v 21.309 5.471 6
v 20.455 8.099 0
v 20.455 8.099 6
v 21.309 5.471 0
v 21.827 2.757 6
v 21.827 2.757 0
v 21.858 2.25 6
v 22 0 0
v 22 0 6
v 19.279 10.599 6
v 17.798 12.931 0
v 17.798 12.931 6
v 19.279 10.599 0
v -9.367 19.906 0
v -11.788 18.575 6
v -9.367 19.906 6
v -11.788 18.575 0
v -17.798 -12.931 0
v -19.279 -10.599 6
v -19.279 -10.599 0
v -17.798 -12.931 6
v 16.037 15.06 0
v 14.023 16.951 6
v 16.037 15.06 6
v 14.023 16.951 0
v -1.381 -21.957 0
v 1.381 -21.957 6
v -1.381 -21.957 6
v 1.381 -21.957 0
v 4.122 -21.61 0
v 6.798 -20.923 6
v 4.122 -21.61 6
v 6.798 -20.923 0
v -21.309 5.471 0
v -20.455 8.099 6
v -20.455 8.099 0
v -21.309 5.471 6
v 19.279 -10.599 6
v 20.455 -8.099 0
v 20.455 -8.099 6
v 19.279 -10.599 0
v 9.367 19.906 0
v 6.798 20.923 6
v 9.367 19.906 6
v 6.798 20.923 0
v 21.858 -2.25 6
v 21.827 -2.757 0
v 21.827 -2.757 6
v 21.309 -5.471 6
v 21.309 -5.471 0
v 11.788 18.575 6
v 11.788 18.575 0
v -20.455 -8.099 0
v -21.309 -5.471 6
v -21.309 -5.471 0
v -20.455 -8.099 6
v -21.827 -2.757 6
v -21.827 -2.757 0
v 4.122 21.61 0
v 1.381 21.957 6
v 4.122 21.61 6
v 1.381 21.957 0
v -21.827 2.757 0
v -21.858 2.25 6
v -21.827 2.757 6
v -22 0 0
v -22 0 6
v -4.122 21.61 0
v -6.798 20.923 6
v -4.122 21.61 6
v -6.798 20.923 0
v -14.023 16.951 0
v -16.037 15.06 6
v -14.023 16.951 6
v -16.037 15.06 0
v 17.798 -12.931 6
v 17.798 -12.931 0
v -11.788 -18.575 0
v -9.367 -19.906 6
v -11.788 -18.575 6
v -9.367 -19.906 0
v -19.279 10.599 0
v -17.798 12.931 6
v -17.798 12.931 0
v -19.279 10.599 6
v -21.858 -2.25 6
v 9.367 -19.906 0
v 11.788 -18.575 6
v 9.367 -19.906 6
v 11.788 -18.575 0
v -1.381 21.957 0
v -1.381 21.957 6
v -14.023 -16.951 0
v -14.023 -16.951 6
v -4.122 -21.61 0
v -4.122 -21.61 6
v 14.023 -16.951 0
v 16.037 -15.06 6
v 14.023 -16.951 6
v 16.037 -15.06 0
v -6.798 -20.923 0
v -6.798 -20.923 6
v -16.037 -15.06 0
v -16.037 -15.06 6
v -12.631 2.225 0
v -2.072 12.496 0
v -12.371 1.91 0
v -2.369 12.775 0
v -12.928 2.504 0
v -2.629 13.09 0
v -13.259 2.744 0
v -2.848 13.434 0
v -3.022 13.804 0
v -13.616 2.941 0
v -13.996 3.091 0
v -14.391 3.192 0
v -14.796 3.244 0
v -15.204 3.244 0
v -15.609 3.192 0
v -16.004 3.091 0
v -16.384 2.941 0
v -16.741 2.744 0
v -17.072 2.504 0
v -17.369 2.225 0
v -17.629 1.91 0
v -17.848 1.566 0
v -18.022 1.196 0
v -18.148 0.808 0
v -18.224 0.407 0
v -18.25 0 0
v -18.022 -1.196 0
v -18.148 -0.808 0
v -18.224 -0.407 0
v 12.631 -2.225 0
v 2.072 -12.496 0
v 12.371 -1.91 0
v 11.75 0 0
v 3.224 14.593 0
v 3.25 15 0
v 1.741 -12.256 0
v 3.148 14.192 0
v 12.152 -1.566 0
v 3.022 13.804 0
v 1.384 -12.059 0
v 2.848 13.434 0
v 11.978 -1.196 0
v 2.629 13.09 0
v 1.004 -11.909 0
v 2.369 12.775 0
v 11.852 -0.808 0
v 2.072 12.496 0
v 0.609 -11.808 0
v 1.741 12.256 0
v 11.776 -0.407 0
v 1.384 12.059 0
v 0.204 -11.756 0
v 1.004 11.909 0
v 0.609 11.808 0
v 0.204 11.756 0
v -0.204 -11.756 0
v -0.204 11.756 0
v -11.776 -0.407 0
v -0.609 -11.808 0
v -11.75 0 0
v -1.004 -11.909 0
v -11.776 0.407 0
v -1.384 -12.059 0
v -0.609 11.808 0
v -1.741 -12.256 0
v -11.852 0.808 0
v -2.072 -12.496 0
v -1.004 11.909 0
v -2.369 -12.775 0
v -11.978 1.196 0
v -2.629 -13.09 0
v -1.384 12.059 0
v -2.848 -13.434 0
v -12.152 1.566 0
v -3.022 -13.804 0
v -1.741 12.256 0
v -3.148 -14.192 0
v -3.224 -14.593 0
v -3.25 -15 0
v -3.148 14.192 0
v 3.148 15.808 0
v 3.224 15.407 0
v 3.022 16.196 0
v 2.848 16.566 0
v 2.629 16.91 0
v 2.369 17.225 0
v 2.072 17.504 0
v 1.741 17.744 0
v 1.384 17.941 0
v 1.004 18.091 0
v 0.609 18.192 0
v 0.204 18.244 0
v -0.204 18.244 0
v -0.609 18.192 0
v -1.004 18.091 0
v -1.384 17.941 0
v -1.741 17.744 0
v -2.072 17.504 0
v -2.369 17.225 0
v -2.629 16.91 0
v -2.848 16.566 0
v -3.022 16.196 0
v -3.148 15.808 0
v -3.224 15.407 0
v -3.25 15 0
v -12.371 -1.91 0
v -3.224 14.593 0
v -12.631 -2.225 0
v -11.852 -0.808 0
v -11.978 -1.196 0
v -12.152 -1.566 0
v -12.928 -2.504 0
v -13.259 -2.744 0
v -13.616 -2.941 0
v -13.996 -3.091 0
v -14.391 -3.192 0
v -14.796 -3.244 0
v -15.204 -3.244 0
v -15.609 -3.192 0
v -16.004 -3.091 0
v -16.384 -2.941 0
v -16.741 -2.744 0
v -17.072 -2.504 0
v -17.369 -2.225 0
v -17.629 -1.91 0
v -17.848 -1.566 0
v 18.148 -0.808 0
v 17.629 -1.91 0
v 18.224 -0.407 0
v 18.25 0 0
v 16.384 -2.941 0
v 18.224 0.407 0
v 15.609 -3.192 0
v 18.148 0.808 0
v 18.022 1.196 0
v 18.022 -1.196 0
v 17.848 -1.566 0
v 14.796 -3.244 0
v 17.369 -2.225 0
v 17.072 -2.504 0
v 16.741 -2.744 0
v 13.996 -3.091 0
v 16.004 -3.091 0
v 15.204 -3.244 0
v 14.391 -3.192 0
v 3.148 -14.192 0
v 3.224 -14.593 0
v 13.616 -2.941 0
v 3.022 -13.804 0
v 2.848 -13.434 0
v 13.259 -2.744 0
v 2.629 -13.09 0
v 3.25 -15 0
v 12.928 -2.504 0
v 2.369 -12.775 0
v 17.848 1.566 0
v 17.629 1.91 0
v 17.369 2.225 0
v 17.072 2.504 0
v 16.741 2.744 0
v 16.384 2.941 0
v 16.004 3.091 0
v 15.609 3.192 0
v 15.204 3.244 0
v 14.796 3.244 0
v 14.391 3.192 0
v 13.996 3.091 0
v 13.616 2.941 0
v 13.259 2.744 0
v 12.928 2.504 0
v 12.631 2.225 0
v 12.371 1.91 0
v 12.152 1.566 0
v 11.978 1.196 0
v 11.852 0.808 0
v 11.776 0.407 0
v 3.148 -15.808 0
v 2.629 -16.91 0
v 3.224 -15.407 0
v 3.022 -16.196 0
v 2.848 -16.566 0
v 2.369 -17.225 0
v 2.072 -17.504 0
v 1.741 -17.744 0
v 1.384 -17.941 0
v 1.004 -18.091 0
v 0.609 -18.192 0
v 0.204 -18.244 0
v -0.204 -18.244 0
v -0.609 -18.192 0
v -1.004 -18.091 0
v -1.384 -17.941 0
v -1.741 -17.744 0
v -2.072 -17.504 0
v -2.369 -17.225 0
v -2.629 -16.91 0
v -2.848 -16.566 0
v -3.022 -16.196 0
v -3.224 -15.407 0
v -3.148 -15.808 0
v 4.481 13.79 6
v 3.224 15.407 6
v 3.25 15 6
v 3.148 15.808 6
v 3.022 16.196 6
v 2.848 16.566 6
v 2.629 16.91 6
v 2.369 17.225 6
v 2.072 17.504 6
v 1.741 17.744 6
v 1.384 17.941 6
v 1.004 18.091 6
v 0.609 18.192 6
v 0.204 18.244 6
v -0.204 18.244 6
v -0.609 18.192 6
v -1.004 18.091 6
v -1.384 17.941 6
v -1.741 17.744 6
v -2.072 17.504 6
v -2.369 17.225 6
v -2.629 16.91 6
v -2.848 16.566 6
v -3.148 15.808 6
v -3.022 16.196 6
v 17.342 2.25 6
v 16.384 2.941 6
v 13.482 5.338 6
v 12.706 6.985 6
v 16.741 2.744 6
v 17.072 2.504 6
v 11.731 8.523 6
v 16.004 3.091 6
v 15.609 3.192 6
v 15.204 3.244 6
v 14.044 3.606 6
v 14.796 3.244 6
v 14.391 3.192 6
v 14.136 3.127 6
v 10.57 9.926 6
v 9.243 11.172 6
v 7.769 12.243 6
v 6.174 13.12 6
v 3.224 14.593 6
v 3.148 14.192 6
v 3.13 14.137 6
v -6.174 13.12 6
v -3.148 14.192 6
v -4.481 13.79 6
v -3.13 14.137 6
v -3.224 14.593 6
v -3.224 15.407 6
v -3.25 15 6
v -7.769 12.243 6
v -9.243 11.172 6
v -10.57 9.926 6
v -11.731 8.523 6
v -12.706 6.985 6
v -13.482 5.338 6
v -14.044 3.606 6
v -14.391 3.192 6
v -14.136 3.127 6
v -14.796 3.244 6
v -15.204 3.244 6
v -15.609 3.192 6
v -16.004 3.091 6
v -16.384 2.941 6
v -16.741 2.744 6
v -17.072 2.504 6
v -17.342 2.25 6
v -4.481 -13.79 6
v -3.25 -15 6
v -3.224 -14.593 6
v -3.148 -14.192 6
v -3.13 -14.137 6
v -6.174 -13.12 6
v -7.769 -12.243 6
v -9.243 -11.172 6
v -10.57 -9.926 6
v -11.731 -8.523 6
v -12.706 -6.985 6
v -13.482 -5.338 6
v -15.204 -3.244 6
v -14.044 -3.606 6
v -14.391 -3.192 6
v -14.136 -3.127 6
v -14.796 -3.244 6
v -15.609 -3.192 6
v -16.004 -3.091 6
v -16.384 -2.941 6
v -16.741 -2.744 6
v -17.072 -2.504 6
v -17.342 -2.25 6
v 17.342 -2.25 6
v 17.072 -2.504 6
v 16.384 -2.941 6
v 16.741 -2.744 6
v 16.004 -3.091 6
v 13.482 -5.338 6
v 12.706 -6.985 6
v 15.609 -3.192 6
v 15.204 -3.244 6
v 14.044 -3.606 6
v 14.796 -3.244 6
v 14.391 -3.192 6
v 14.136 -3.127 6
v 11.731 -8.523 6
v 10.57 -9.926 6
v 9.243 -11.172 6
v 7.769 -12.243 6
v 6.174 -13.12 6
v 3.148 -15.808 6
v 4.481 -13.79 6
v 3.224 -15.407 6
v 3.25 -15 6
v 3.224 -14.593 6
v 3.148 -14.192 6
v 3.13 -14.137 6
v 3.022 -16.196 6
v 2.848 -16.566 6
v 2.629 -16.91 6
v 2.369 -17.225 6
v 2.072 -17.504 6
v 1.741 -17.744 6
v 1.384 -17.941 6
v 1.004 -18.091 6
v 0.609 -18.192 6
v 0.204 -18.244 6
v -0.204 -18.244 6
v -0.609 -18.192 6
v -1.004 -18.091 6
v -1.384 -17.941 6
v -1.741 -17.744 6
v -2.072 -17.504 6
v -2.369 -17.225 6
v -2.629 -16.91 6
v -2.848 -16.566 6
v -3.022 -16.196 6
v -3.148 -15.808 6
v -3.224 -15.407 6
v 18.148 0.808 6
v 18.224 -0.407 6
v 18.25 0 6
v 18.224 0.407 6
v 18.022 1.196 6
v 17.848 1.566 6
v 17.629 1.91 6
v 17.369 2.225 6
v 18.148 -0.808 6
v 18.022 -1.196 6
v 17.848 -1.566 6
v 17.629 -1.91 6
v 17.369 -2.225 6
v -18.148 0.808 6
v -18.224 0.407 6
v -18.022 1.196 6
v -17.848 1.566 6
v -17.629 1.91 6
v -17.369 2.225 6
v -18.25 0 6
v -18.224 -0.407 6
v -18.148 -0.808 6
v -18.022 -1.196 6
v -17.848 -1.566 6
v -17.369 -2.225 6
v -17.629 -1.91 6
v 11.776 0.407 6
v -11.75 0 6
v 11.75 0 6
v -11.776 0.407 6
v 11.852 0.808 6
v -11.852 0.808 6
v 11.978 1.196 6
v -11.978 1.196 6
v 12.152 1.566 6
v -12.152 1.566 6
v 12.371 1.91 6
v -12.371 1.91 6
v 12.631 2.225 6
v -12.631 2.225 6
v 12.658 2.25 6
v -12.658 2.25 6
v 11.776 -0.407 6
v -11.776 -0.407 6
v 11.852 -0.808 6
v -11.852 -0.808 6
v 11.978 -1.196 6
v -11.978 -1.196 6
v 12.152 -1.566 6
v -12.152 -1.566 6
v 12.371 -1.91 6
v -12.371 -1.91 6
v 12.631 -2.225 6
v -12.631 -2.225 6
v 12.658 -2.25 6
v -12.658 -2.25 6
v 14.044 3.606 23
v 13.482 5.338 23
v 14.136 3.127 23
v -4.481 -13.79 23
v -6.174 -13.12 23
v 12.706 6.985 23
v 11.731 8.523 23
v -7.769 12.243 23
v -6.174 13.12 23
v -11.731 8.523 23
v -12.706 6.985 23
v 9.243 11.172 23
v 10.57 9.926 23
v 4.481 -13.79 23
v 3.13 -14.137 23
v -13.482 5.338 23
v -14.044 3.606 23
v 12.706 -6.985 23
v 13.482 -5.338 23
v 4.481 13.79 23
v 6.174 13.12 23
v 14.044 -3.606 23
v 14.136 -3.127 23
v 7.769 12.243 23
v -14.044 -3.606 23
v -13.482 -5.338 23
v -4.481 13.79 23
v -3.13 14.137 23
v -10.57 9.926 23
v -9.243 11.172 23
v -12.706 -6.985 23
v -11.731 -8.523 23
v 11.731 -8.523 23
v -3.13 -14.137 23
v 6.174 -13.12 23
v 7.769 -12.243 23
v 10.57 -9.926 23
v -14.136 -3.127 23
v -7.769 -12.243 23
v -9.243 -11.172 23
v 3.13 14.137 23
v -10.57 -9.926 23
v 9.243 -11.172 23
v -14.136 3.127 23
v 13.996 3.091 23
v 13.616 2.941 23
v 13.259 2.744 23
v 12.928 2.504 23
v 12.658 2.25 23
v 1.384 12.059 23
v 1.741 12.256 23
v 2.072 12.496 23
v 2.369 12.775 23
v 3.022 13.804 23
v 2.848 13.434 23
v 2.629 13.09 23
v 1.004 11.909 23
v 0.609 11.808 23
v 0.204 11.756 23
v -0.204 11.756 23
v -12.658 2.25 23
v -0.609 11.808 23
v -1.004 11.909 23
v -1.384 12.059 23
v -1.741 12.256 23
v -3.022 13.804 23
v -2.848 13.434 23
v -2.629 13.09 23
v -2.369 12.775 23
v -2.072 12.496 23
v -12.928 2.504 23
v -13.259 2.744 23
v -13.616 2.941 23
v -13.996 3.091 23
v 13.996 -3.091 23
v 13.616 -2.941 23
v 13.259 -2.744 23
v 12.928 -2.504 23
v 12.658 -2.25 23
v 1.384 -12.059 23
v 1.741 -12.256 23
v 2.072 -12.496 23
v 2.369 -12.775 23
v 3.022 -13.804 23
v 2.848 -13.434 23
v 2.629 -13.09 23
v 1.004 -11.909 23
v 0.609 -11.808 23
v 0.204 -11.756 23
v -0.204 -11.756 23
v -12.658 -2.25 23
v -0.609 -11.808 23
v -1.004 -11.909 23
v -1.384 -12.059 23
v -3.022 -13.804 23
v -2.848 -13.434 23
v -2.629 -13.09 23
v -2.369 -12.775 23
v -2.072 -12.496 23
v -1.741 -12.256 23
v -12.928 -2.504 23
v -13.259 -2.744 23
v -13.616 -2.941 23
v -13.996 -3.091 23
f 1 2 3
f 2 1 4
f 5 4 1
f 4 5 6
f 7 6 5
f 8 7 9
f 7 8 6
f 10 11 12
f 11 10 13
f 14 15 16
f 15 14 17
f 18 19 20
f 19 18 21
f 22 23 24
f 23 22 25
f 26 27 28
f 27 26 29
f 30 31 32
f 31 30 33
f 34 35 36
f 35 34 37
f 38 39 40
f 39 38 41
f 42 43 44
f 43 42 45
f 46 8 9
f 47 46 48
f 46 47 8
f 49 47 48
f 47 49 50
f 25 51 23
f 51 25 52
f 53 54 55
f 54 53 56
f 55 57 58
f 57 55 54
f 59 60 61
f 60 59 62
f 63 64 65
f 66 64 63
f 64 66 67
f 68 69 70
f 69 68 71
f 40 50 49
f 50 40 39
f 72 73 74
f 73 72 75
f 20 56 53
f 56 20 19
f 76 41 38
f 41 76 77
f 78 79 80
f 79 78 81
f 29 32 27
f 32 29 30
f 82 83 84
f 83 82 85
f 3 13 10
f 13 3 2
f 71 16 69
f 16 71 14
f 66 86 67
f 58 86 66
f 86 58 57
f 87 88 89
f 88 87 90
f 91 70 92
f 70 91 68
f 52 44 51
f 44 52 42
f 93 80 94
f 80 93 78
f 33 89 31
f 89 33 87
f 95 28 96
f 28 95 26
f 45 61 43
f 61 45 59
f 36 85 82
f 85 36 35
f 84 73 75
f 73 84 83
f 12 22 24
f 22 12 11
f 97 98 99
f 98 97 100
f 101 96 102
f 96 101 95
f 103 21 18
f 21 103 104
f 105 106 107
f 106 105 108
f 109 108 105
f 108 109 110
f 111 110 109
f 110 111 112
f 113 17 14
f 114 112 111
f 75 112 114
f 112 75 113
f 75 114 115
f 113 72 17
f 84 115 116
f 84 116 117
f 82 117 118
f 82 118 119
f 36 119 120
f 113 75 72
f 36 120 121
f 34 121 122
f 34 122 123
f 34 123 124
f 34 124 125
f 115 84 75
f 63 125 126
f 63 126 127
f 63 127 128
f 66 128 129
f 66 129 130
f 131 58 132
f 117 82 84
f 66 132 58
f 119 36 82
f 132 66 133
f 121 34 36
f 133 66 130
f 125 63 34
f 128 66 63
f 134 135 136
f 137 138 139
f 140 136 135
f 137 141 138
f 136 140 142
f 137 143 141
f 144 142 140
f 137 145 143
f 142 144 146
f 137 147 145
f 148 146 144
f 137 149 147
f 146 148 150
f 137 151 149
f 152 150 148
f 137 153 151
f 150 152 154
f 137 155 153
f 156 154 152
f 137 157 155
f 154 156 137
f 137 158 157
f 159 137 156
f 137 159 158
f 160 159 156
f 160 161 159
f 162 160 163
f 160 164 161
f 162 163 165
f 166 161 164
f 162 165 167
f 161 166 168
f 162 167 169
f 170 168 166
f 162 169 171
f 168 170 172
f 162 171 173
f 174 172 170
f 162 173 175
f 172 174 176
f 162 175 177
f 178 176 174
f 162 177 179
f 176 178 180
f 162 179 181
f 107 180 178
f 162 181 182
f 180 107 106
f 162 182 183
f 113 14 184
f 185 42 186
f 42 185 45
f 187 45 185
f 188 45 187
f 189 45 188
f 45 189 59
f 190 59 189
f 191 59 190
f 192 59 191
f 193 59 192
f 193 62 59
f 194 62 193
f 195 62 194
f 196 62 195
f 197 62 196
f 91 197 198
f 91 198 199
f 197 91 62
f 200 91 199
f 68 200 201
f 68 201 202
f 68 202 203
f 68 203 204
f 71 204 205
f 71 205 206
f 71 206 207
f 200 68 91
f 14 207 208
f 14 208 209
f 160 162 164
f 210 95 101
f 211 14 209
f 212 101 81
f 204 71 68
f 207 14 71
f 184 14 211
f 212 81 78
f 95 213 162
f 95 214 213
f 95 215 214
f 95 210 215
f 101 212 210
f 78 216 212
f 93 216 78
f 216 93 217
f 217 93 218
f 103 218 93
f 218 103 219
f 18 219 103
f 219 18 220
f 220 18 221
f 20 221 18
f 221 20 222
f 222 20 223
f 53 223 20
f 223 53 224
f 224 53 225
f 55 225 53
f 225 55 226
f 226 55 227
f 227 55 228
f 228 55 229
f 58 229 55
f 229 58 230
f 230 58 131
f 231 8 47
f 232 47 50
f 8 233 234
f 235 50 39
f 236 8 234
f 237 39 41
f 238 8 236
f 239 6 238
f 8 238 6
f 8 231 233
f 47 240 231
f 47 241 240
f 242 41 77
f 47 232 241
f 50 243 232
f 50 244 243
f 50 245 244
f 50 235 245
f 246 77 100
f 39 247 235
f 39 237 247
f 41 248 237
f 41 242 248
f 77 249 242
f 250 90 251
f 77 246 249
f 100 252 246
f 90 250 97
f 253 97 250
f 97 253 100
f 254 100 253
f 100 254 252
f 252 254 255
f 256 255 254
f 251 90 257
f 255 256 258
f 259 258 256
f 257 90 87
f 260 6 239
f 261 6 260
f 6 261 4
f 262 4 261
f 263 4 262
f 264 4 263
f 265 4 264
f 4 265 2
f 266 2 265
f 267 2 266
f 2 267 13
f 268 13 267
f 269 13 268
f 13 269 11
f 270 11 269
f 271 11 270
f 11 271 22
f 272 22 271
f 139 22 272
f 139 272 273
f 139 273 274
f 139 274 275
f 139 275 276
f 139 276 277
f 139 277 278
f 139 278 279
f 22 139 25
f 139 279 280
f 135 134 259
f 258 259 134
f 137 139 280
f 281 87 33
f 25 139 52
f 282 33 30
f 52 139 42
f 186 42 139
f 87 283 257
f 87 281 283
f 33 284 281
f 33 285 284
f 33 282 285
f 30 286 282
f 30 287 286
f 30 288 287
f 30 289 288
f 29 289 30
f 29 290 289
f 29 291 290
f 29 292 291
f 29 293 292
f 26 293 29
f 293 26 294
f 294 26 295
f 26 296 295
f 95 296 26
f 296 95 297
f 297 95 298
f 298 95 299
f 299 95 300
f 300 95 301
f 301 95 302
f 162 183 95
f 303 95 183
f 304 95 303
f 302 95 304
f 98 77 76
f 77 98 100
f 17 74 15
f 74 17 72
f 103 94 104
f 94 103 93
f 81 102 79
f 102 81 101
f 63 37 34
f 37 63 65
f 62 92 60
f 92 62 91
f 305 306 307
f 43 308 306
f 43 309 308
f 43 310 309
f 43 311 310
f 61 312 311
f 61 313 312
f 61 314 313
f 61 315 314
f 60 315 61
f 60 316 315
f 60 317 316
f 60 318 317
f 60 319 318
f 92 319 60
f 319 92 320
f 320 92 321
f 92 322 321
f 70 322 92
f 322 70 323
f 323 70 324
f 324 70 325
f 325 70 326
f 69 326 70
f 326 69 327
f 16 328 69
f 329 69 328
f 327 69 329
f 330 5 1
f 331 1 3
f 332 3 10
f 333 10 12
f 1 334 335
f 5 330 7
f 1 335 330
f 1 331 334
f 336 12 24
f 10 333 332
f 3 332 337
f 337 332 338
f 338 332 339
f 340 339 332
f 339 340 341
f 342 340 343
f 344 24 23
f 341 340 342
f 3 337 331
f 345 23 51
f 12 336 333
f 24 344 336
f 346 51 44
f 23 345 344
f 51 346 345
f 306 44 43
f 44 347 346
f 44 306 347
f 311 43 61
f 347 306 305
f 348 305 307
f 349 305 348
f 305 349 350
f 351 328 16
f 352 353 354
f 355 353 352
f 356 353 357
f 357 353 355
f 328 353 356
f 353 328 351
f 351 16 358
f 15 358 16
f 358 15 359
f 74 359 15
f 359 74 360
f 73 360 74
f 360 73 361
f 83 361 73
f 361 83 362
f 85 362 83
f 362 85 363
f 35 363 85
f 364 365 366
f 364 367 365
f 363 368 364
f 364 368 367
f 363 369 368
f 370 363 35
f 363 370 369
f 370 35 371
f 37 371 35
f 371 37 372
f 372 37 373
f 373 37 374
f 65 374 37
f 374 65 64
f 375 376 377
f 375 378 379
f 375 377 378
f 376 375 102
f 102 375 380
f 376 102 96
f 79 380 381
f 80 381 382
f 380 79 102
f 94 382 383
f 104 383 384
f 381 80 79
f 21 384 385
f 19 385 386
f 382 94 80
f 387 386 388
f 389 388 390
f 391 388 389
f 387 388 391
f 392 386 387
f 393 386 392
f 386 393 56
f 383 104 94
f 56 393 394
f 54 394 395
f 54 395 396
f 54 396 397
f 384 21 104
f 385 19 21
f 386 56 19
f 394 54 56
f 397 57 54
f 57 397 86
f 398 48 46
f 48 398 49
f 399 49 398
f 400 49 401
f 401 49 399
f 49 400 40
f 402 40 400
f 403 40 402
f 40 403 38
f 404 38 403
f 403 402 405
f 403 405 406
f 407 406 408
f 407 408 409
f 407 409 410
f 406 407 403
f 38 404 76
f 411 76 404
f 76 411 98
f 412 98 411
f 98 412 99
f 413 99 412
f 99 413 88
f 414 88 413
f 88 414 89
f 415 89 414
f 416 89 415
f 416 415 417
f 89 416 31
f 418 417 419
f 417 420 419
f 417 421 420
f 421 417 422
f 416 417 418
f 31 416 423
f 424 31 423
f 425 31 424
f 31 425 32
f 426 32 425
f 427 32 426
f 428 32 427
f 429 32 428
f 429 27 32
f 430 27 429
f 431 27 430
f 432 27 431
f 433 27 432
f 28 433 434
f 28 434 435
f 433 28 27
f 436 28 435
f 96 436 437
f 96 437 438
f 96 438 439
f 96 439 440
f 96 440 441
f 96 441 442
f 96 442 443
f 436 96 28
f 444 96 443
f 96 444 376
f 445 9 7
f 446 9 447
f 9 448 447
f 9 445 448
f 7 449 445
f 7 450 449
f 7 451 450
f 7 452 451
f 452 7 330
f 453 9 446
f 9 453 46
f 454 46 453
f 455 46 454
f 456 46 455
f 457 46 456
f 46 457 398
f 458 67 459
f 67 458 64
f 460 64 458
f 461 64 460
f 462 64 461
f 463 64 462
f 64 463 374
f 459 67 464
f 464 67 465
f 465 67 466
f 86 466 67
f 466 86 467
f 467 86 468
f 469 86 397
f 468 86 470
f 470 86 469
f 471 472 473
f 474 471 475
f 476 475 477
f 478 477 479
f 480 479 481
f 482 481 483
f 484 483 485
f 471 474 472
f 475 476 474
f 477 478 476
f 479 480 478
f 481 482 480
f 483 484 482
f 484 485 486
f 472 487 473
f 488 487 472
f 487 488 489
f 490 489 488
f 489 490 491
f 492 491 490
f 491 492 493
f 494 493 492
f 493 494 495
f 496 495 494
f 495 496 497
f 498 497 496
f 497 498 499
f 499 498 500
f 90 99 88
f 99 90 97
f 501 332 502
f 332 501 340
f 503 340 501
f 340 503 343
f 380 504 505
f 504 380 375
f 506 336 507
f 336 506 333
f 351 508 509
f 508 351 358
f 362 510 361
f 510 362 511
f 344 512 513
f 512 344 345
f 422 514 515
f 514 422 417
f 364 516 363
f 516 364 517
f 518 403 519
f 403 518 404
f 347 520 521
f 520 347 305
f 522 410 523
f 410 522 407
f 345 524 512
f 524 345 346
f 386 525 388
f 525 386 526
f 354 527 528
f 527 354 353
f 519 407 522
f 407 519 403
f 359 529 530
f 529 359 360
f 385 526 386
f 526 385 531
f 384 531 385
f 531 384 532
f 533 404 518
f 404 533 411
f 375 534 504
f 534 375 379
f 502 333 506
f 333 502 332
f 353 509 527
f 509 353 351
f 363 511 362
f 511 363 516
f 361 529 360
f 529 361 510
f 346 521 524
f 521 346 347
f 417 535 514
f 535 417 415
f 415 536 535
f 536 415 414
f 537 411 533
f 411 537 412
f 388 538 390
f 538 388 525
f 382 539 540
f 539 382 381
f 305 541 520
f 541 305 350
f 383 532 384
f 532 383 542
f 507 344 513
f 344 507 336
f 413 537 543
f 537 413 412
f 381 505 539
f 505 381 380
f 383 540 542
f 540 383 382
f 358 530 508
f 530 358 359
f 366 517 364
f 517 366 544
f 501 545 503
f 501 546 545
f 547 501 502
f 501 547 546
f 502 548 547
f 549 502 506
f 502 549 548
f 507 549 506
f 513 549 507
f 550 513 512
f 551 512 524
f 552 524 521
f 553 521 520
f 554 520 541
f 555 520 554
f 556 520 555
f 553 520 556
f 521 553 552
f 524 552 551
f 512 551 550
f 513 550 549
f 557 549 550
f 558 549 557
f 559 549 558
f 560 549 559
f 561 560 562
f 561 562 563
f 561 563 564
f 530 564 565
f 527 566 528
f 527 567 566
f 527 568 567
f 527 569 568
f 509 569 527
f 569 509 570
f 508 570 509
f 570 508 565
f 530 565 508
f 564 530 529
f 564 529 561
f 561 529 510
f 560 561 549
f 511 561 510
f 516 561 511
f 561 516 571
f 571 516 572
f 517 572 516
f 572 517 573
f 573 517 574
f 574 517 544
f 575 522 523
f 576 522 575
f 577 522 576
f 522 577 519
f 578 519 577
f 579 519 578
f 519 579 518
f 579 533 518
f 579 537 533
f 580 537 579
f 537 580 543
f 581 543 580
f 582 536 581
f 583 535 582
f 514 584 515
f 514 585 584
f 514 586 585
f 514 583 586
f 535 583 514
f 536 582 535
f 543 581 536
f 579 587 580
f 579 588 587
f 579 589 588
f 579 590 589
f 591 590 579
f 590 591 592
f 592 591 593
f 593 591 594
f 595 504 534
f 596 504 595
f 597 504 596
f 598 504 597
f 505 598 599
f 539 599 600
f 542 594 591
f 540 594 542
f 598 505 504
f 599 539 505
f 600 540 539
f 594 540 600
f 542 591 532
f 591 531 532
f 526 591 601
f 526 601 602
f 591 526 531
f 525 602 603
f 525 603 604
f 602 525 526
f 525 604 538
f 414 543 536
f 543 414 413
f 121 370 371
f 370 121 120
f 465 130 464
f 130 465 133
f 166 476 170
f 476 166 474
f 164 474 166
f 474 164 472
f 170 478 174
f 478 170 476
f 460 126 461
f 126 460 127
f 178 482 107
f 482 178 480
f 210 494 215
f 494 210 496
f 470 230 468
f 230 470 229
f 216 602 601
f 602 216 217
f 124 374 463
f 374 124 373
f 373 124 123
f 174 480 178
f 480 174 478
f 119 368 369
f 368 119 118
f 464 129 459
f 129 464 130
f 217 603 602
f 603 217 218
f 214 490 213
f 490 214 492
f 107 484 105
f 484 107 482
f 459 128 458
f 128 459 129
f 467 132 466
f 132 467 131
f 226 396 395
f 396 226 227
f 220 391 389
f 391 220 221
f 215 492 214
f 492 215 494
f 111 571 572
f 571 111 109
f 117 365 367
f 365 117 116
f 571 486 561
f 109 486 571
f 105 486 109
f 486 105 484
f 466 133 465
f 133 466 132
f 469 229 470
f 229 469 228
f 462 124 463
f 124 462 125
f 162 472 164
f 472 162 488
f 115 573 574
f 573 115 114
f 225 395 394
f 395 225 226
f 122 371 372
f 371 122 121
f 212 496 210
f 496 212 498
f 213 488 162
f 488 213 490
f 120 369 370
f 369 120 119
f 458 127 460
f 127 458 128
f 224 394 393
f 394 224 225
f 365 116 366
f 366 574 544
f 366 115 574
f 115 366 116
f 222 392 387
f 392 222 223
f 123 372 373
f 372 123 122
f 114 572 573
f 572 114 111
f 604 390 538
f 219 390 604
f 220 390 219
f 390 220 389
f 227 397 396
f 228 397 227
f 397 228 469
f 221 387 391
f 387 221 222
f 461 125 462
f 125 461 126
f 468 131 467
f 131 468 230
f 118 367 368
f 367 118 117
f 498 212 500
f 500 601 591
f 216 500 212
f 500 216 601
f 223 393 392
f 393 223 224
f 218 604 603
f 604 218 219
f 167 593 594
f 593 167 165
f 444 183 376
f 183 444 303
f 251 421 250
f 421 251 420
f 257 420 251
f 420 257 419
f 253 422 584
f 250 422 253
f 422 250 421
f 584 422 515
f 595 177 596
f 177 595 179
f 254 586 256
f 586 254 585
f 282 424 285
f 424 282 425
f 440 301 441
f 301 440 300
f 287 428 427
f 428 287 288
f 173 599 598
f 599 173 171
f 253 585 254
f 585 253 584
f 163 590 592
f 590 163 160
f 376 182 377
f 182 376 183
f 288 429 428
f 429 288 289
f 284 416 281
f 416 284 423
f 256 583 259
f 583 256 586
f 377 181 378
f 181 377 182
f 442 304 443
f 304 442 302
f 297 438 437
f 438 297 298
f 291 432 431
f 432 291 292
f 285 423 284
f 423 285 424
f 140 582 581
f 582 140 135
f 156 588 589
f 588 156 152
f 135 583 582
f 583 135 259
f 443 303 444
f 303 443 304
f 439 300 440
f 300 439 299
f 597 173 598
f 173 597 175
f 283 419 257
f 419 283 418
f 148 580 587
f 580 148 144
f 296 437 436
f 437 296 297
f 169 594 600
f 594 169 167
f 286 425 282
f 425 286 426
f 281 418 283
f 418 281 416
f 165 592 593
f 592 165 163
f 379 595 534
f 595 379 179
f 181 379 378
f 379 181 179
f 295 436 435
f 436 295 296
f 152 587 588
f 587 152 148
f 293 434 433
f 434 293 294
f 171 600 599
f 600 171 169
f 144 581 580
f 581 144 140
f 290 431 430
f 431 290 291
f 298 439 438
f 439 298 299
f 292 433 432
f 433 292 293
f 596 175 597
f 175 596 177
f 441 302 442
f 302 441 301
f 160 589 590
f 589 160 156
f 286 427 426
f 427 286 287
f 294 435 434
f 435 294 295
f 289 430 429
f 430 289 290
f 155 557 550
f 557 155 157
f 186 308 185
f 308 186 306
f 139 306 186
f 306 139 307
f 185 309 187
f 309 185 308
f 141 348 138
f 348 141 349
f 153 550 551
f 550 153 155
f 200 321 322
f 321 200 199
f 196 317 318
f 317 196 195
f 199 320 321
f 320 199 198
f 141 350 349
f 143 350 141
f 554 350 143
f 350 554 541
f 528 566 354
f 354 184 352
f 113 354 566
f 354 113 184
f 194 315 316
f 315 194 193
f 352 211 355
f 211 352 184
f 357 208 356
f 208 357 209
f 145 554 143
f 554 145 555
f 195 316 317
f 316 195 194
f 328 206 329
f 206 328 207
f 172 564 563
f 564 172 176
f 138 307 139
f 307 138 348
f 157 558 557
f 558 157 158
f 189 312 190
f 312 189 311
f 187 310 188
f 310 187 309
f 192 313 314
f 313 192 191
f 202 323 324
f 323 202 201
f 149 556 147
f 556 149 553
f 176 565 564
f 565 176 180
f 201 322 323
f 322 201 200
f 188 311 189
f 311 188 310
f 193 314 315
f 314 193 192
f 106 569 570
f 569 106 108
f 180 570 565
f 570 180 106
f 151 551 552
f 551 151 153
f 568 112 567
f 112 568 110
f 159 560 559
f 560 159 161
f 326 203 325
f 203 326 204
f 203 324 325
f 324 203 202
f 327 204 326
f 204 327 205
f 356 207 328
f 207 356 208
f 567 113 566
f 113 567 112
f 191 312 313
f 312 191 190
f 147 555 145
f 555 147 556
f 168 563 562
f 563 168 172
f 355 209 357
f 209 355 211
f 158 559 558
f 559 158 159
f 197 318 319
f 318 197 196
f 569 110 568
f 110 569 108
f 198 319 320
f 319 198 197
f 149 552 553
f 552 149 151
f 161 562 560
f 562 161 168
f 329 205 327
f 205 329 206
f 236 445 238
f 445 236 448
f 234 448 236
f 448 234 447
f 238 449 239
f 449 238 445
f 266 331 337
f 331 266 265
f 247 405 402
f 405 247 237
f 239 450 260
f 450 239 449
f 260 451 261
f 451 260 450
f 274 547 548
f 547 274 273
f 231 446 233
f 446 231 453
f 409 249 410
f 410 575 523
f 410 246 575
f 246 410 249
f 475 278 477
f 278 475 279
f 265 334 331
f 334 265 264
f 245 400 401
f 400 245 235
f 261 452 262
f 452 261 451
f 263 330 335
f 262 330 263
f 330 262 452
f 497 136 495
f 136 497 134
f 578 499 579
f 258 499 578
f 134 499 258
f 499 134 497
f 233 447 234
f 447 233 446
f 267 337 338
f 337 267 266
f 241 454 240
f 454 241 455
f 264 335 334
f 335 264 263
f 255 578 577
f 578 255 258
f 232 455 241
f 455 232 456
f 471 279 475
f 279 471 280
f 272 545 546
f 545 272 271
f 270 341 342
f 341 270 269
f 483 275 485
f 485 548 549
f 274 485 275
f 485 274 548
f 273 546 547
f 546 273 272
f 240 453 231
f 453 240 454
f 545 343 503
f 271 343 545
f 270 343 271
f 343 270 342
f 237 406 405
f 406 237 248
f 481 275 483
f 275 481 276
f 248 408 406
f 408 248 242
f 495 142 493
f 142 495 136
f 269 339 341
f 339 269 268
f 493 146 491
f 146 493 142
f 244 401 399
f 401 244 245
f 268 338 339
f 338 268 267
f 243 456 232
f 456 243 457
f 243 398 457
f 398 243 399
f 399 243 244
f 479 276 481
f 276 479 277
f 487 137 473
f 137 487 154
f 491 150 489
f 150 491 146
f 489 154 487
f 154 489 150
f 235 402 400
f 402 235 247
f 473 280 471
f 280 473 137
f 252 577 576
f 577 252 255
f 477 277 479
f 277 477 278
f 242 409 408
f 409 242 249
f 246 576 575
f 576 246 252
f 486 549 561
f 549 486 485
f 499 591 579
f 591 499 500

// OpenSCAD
$fn = 50;


difference() {
	union() {
		cylinder(h = 6, r = 22.0000000000);
		translate(v = [0, 0, 3.0000000000]) {
			cylinder(h = 20, r = 14.5000000000);
		}
	}
	union() {
		translate(v = [-15.0000000000, 0.0000000000, 0.0000000000]) {
			cylinder(h = 100, r = 3.2500000000);
		}
		translate(v = [0.0000000000, -15.0000000000, 0.0000000000]) {
			cylinder(h = 100, r = 3.2500000000);
		}
		translate(v = [0.0000000000, 15.0000000000, 0.0000000000]) {
			cylinder(h = 100, r = 3.2500000000);
		}
		translate(v = [15.0000000000, 0.0000000000, 0.0000000000]) {
			cylinder(h = 100, r = 3.2500000000);
		}
		translate(v = [-27.0000000000, -2.2500000000, 6]) {
			cube(size = [54, 4.5000000000, 20]);
		}
	}
}
